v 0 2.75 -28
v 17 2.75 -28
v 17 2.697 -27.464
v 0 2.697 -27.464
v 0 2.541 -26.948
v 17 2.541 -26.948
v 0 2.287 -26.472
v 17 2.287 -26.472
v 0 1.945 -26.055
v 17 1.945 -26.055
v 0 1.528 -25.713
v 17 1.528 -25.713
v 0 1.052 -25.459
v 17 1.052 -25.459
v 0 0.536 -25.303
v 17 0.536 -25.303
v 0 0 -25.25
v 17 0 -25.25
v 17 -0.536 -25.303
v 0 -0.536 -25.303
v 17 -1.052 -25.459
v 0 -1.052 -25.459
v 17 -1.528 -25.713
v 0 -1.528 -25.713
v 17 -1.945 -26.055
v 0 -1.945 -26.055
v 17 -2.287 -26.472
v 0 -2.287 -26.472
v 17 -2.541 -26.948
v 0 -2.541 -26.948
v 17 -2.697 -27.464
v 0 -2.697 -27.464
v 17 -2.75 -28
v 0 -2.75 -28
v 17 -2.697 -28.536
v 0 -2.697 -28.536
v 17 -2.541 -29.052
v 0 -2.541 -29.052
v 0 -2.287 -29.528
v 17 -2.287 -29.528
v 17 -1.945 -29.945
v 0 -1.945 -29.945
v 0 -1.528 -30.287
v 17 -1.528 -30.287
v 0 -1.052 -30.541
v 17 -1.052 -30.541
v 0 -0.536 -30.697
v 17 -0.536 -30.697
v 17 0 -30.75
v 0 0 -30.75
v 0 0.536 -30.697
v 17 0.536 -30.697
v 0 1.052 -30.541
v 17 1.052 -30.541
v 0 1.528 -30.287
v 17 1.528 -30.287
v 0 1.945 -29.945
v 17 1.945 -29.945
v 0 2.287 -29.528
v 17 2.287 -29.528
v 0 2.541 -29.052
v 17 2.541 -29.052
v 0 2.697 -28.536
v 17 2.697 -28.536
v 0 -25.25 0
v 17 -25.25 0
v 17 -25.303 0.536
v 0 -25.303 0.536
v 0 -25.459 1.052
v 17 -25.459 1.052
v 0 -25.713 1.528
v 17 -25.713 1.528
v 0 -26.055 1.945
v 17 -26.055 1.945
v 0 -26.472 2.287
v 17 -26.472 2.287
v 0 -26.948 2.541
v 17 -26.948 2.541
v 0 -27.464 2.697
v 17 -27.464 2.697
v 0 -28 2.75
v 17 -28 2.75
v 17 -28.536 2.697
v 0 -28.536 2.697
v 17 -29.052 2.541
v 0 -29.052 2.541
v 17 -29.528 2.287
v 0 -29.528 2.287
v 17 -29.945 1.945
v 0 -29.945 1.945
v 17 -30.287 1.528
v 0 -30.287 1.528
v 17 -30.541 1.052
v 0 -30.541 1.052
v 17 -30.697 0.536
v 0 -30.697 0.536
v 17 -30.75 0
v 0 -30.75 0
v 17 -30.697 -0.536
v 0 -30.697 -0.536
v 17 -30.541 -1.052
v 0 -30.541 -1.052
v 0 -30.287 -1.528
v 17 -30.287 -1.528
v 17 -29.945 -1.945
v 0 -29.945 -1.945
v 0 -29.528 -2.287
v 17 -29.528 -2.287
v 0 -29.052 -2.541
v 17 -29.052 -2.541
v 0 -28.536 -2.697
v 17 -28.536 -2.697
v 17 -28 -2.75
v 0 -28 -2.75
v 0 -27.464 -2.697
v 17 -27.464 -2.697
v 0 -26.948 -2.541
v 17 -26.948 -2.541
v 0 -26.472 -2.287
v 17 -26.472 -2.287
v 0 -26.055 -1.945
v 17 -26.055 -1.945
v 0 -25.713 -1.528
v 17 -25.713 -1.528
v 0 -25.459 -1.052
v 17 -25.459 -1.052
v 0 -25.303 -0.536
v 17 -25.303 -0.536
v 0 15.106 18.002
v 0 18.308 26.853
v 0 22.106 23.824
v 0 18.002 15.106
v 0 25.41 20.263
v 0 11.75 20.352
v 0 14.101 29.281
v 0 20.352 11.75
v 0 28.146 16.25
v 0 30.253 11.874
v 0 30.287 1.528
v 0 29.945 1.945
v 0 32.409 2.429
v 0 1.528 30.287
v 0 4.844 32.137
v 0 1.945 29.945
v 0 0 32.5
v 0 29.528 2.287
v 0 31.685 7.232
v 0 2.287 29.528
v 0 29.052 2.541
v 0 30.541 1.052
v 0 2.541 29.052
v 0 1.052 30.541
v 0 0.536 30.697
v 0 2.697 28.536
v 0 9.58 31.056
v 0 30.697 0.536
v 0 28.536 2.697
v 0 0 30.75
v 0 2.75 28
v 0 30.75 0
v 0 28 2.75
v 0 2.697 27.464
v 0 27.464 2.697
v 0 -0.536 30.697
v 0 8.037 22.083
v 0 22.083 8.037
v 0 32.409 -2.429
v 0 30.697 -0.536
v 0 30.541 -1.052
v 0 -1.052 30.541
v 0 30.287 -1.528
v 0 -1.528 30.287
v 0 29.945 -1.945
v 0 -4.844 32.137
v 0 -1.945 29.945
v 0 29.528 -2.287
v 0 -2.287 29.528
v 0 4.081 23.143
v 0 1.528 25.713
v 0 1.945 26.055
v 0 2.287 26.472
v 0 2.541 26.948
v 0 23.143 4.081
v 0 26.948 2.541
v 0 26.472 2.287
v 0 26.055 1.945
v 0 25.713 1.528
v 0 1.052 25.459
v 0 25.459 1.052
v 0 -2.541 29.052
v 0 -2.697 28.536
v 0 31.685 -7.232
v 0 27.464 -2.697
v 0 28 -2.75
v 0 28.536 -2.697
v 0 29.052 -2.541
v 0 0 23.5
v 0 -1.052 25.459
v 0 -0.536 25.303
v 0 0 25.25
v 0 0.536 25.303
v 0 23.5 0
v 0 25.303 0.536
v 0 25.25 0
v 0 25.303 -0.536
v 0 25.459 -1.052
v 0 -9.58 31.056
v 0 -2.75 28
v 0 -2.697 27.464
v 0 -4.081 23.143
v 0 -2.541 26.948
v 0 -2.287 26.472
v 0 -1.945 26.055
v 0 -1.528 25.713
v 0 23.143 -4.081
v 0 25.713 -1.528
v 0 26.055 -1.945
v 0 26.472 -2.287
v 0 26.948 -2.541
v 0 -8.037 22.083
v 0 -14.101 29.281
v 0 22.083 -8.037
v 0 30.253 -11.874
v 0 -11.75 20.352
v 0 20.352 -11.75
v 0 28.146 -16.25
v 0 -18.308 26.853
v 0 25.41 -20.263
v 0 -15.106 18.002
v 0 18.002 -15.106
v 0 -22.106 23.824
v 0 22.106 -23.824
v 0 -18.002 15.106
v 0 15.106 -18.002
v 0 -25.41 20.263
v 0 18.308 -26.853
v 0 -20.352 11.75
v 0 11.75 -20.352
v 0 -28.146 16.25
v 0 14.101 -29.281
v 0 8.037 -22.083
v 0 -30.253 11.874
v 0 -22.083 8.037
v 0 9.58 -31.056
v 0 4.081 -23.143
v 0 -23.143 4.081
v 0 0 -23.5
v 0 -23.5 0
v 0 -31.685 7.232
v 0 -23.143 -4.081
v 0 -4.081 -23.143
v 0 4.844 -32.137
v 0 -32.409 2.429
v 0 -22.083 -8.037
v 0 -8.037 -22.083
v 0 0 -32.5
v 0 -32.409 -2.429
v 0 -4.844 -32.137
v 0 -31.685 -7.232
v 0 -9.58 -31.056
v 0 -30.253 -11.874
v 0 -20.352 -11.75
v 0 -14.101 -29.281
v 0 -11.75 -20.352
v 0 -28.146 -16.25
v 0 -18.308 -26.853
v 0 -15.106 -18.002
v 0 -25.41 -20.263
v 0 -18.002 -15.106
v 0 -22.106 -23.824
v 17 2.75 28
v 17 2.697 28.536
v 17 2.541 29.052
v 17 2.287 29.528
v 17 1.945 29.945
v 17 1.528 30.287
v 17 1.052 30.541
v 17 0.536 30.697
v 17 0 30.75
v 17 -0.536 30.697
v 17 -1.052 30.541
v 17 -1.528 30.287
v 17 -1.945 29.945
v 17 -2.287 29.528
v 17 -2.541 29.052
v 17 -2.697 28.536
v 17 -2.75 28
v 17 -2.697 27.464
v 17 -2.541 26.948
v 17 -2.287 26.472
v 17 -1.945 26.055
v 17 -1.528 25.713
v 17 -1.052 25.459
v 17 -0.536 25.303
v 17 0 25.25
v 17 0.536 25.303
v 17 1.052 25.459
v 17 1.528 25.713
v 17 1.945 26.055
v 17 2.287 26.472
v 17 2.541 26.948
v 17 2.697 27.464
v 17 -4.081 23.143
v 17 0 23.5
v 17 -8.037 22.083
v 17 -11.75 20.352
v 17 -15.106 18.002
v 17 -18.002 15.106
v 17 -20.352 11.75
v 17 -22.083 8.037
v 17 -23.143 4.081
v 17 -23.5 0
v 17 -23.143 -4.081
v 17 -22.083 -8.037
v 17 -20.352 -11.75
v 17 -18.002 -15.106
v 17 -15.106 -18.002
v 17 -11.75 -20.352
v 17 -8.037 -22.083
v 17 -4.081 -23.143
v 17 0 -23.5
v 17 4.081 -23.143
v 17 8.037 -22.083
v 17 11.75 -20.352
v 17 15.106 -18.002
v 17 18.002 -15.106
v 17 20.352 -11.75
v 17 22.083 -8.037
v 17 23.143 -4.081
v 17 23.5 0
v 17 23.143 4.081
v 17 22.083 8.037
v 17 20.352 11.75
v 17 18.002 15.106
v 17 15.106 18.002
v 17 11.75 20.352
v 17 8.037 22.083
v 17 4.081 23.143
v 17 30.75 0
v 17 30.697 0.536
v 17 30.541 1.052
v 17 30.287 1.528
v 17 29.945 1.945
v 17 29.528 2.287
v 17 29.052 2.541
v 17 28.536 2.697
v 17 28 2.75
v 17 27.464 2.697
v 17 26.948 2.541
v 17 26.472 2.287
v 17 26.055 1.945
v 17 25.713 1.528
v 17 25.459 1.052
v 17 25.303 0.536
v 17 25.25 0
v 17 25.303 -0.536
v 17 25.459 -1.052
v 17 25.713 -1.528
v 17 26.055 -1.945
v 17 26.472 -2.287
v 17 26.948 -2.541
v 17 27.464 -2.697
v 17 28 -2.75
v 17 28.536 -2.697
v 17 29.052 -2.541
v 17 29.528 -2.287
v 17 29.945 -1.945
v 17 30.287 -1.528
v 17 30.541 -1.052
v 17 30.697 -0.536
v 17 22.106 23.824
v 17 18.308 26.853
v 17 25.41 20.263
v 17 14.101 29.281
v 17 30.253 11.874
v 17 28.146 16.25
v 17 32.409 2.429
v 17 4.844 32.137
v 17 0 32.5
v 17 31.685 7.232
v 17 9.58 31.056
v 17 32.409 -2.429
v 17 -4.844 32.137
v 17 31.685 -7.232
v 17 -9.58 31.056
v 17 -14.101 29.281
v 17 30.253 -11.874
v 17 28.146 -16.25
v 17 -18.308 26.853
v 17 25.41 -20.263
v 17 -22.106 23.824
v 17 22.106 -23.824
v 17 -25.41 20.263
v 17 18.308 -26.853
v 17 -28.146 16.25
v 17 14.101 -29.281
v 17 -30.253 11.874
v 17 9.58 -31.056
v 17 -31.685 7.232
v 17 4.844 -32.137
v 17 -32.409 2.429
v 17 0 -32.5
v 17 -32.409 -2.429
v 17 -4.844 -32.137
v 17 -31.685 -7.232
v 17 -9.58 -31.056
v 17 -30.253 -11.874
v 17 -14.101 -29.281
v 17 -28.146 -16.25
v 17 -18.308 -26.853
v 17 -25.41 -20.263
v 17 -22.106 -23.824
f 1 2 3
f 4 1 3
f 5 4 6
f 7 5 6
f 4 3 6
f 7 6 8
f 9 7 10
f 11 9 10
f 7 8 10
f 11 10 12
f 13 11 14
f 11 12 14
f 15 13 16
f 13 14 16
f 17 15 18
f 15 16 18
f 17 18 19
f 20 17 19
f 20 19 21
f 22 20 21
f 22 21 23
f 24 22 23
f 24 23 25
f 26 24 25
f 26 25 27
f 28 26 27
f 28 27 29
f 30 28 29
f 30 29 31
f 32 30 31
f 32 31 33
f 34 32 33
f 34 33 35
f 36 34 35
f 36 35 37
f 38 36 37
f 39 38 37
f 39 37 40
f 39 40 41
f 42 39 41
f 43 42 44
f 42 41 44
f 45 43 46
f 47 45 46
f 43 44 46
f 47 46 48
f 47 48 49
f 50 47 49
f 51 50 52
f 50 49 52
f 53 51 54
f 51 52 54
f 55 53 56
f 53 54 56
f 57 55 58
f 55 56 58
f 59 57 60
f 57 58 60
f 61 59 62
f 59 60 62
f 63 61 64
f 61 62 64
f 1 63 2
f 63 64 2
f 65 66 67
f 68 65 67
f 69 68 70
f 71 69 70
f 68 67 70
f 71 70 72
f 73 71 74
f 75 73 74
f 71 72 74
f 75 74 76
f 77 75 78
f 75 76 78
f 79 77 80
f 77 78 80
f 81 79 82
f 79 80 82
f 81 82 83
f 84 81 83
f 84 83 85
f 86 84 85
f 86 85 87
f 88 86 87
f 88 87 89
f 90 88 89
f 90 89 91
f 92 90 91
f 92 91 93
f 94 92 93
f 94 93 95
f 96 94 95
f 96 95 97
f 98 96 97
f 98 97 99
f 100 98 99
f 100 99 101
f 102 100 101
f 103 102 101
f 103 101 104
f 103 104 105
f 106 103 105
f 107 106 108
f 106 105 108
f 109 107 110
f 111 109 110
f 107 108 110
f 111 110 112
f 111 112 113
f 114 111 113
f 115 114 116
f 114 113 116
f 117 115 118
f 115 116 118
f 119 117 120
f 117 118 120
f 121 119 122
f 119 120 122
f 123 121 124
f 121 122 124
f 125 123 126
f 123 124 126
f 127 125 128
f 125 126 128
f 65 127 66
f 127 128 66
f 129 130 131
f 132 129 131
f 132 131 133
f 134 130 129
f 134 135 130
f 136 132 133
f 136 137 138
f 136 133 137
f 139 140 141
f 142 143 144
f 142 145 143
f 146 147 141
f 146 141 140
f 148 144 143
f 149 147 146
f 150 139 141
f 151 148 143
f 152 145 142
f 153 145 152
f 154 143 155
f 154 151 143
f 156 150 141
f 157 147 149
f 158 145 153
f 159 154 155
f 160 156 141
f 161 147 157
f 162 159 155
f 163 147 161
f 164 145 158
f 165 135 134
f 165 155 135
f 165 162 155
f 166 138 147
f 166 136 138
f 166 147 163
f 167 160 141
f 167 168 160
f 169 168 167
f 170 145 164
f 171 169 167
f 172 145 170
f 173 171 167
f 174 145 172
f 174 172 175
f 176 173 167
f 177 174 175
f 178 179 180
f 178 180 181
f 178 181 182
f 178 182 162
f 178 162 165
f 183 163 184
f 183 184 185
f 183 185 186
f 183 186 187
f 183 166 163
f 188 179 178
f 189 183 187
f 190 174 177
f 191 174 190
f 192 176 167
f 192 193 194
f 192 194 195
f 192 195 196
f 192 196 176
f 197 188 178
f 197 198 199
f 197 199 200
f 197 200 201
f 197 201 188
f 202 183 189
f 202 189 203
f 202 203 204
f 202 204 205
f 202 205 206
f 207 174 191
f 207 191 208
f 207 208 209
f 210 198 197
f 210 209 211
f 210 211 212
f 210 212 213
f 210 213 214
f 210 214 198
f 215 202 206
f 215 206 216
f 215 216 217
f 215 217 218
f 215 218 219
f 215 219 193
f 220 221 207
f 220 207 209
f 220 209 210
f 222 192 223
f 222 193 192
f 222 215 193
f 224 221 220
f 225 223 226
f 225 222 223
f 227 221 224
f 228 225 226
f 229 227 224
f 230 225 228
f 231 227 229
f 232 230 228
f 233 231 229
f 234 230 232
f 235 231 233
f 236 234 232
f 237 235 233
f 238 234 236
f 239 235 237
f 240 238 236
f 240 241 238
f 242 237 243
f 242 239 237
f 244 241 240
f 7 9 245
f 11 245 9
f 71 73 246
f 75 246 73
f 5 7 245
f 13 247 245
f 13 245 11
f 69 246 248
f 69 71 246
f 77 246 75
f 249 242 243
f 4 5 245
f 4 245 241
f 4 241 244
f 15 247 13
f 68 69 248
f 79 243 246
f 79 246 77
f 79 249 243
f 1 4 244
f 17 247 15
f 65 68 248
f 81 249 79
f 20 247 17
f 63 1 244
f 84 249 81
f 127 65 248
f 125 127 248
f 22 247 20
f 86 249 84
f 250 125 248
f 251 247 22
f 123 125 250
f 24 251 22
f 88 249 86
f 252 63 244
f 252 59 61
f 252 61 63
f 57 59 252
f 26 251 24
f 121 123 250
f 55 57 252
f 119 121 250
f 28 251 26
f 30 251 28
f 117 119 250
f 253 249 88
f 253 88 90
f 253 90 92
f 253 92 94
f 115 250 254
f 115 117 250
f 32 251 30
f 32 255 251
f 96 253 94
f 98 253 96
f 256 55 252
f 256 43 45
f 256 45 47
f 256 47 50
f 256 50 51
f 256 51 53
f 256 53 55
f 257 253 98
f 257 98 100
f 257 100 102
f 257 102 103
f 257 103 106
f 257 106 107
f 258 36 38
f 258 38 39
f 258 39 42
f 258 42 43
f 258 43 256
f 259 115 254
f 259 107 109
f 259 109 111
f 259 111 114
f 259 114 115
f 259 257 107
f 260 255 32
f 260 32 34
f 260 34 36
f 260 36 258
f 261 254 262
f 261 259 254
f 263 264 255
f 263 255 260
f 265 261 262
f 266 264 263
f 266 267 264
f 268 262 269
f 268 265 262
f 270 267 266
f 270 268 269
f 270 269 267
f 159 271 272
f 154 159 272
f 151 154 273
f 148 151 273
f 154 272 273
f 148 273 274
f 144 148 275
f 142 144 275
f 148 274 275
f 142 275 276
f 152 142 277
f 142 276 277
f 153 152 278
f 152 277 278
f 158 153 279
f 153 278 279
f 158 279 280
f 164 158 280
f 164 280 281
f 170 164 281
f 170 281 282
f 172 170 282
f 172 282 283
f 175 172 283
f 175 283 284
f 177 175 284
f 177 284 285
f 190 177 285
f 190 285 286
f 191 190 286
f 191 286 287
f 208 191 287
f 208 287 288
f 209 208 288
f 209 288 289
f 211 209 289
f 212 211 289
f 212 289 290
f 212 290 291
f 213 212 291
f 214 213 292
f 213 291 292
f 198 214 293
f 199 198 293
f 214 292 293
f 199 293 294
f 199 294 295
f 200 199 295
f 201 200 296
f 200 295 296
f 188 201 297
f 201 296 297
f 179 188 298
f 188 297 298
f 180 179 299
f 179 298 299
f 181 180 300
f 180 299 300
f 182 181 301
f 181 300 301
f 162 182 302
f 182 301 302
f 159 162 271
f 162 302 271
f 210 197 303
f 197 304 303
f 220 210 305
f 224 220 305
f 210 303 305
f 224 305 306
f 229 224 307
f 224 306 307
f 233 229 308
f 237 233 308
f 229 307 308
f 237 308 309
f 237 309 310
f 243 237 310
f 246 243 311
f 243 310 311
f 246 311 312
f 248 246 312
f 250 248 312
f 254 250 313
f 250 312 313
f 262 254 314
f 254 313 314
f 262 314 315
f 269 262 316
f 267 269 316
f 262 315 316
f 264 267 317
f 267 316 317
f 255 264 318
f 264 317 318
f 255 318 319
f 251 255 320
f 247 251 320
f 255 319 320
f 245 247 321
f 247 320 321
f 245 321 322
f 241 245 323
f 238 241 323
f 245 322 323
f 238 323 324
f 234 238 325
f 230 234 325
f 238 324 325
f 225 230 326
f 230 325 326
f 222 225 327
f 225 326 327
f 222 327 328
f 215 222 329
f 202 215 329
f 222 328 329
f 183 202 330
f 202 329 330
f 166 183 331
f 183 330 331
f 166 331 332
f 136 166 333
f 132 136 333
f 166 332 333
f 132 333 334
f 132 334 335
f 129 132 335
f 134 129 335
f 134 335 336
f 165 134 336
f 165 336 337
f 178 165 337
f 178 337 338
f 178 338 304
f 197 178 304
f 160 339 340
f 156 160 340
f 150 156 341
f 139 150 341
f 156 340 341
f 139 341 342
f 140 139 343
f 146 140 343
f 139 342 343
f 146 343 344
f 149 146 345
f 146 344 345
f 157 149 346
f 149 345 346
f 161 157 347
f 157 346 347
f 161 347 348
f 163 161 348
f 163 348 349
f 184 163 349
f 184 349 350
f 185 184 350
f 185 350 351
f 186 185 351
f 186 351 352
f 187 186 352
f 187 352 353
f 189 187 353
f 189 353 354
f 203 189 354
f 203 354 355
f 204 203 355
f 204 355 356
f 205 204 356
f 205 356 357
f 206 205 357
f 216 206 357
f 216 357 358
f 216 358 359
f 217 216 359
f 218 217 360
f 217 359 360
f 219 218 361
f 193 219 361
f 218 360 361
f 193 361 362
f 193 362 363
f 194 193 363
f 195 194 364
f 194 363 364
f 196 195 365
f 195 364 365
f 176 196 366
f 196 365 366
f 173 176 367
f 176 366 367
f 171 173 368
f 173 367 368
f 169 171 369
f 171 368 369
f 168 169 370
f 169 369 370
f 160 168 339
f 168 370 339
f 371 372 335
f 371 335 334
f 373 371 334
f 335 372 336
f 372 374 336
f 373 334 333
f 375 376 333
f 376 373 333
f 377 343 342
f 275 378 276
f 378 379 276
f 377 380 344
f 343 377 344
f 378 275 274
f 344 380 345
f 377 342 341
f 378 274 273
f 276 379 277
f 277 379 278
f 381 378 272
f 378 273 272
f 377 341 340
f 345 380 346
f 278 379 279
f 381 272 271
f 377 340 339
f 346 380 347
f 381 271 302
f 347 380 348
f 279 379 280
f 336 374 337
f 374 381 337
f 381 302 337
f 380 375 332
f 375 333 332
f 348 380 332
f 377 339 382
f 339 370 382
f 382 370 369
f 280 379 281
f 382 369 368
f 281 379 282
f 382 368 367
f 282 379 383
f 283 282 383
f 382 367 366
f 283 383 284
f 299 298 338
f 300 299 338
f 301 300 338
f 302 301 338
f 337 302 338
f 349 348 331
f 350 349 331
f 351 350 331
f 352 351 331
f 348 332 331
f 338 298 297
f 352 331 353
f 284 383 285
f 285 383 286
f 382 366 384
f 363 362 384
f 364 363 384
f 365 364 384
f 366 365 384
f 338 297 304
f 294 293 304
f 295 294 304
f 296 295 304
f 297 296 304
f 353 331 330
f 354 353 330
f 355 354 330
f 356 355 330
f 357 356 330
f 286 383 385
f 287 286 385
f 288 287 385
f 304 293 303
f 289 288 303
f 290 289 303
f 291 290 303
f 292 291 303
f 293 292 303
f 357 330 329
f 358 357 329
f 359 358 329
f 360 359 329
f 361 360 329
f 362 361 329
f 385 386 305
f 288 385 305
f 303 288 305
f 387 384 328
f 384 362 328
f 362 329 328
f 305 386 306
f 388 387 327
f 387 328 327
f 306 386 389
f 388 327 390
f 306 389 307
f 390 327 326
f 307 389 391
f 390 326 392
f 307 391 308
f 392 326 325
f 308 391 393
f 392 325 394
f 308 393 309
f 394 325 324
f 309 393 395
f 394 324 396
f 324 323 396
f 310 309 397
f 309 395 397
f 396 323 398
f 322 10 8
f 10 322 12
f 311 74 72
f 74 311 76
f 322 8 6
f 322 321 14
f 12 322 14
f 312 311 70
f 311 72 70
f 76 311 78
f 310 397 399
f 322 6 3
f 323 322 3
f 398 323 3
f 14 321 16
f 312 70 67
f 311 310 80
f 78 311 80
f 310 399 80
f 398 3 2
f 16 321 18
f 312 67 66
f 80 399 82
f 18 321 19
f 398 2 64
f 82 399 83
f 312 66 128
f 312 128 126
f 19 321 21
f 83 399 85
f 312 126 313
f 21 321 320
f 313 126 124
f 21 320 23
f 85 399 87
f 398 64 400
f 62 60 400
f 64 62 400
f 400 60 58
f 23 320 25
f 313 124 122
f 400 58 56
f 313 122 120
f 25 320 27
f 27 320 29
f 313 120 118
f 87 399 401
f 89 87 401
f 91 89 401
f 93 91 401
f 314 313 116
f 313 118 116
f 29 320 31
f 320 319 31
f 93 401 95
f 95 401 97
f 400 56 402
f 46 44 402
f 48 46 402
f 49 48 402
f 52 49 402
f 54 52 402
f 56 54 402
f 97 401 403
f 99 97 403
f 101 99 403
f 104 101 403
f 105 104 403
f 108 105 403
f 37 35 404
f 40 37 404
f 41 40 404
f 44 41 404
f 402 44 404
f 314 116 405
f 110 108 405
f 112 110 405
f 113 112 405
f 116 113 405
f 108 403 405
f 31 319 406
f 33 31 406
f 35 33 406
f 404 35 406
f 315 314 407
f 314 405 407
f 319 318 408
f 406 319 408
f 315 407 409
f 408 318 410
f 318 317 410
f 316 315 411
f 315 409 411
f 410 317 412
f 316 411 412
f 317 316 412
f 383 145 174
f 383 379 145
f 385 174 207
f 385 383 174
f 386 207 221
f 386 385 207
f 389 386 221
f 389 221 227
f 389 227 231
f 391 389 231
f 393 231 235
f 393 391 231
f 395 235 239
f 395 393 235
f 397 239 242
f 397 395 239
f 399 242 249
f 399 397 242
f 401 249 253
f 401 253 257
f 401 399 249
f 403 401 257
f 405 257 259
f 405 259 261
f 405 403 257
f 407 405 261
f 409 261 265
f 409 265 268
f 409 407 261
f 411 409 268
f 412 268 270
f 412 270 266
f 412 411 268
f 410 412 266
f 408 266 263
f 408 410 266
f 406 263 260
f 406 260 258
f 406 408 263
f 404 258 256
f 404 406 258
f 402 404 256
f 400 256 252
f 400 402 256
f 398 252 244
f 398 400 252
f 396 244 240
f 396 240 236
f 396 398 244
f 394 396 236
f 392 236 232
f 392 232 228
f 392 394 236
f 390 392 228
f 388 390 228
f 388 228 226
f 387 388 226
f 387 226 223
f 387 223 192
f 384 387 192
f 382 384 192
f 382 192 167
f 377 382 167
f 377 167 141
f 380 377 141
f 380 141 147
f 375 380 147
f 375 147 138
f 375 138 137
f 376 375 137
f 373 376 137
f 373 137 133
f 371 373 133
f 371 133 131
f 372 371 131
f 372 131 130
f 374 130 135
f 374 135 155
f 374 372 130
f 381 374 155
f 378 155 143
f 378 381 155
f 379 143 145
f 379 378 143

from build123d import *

# Parameters (mm, degrees)
F0_W = 17
F0_H = 9
F3_D = 5.5


with BuildPart() as f1:
    # F0 (on Front) → F1 (revolve)
    with BuildSketch(Plane.XZ):
        with Locations((8.5, 28)):
            Rectangle(F0_W, F0_H)
    revolve(axis=Axis((1.6395361068, 0, 0), (1, 0, 0)))

    # F3 (through all)
    with Locations(Plane(origin=(0, 0, 0), x_dir=(0, -1, 0), z_dir=(-1, 0, 0))):
        with Locations((0, 28), (28, 0), (0, -28), (-28, 0)):
            Hole(F3_D / 2)


solid = f1.part
